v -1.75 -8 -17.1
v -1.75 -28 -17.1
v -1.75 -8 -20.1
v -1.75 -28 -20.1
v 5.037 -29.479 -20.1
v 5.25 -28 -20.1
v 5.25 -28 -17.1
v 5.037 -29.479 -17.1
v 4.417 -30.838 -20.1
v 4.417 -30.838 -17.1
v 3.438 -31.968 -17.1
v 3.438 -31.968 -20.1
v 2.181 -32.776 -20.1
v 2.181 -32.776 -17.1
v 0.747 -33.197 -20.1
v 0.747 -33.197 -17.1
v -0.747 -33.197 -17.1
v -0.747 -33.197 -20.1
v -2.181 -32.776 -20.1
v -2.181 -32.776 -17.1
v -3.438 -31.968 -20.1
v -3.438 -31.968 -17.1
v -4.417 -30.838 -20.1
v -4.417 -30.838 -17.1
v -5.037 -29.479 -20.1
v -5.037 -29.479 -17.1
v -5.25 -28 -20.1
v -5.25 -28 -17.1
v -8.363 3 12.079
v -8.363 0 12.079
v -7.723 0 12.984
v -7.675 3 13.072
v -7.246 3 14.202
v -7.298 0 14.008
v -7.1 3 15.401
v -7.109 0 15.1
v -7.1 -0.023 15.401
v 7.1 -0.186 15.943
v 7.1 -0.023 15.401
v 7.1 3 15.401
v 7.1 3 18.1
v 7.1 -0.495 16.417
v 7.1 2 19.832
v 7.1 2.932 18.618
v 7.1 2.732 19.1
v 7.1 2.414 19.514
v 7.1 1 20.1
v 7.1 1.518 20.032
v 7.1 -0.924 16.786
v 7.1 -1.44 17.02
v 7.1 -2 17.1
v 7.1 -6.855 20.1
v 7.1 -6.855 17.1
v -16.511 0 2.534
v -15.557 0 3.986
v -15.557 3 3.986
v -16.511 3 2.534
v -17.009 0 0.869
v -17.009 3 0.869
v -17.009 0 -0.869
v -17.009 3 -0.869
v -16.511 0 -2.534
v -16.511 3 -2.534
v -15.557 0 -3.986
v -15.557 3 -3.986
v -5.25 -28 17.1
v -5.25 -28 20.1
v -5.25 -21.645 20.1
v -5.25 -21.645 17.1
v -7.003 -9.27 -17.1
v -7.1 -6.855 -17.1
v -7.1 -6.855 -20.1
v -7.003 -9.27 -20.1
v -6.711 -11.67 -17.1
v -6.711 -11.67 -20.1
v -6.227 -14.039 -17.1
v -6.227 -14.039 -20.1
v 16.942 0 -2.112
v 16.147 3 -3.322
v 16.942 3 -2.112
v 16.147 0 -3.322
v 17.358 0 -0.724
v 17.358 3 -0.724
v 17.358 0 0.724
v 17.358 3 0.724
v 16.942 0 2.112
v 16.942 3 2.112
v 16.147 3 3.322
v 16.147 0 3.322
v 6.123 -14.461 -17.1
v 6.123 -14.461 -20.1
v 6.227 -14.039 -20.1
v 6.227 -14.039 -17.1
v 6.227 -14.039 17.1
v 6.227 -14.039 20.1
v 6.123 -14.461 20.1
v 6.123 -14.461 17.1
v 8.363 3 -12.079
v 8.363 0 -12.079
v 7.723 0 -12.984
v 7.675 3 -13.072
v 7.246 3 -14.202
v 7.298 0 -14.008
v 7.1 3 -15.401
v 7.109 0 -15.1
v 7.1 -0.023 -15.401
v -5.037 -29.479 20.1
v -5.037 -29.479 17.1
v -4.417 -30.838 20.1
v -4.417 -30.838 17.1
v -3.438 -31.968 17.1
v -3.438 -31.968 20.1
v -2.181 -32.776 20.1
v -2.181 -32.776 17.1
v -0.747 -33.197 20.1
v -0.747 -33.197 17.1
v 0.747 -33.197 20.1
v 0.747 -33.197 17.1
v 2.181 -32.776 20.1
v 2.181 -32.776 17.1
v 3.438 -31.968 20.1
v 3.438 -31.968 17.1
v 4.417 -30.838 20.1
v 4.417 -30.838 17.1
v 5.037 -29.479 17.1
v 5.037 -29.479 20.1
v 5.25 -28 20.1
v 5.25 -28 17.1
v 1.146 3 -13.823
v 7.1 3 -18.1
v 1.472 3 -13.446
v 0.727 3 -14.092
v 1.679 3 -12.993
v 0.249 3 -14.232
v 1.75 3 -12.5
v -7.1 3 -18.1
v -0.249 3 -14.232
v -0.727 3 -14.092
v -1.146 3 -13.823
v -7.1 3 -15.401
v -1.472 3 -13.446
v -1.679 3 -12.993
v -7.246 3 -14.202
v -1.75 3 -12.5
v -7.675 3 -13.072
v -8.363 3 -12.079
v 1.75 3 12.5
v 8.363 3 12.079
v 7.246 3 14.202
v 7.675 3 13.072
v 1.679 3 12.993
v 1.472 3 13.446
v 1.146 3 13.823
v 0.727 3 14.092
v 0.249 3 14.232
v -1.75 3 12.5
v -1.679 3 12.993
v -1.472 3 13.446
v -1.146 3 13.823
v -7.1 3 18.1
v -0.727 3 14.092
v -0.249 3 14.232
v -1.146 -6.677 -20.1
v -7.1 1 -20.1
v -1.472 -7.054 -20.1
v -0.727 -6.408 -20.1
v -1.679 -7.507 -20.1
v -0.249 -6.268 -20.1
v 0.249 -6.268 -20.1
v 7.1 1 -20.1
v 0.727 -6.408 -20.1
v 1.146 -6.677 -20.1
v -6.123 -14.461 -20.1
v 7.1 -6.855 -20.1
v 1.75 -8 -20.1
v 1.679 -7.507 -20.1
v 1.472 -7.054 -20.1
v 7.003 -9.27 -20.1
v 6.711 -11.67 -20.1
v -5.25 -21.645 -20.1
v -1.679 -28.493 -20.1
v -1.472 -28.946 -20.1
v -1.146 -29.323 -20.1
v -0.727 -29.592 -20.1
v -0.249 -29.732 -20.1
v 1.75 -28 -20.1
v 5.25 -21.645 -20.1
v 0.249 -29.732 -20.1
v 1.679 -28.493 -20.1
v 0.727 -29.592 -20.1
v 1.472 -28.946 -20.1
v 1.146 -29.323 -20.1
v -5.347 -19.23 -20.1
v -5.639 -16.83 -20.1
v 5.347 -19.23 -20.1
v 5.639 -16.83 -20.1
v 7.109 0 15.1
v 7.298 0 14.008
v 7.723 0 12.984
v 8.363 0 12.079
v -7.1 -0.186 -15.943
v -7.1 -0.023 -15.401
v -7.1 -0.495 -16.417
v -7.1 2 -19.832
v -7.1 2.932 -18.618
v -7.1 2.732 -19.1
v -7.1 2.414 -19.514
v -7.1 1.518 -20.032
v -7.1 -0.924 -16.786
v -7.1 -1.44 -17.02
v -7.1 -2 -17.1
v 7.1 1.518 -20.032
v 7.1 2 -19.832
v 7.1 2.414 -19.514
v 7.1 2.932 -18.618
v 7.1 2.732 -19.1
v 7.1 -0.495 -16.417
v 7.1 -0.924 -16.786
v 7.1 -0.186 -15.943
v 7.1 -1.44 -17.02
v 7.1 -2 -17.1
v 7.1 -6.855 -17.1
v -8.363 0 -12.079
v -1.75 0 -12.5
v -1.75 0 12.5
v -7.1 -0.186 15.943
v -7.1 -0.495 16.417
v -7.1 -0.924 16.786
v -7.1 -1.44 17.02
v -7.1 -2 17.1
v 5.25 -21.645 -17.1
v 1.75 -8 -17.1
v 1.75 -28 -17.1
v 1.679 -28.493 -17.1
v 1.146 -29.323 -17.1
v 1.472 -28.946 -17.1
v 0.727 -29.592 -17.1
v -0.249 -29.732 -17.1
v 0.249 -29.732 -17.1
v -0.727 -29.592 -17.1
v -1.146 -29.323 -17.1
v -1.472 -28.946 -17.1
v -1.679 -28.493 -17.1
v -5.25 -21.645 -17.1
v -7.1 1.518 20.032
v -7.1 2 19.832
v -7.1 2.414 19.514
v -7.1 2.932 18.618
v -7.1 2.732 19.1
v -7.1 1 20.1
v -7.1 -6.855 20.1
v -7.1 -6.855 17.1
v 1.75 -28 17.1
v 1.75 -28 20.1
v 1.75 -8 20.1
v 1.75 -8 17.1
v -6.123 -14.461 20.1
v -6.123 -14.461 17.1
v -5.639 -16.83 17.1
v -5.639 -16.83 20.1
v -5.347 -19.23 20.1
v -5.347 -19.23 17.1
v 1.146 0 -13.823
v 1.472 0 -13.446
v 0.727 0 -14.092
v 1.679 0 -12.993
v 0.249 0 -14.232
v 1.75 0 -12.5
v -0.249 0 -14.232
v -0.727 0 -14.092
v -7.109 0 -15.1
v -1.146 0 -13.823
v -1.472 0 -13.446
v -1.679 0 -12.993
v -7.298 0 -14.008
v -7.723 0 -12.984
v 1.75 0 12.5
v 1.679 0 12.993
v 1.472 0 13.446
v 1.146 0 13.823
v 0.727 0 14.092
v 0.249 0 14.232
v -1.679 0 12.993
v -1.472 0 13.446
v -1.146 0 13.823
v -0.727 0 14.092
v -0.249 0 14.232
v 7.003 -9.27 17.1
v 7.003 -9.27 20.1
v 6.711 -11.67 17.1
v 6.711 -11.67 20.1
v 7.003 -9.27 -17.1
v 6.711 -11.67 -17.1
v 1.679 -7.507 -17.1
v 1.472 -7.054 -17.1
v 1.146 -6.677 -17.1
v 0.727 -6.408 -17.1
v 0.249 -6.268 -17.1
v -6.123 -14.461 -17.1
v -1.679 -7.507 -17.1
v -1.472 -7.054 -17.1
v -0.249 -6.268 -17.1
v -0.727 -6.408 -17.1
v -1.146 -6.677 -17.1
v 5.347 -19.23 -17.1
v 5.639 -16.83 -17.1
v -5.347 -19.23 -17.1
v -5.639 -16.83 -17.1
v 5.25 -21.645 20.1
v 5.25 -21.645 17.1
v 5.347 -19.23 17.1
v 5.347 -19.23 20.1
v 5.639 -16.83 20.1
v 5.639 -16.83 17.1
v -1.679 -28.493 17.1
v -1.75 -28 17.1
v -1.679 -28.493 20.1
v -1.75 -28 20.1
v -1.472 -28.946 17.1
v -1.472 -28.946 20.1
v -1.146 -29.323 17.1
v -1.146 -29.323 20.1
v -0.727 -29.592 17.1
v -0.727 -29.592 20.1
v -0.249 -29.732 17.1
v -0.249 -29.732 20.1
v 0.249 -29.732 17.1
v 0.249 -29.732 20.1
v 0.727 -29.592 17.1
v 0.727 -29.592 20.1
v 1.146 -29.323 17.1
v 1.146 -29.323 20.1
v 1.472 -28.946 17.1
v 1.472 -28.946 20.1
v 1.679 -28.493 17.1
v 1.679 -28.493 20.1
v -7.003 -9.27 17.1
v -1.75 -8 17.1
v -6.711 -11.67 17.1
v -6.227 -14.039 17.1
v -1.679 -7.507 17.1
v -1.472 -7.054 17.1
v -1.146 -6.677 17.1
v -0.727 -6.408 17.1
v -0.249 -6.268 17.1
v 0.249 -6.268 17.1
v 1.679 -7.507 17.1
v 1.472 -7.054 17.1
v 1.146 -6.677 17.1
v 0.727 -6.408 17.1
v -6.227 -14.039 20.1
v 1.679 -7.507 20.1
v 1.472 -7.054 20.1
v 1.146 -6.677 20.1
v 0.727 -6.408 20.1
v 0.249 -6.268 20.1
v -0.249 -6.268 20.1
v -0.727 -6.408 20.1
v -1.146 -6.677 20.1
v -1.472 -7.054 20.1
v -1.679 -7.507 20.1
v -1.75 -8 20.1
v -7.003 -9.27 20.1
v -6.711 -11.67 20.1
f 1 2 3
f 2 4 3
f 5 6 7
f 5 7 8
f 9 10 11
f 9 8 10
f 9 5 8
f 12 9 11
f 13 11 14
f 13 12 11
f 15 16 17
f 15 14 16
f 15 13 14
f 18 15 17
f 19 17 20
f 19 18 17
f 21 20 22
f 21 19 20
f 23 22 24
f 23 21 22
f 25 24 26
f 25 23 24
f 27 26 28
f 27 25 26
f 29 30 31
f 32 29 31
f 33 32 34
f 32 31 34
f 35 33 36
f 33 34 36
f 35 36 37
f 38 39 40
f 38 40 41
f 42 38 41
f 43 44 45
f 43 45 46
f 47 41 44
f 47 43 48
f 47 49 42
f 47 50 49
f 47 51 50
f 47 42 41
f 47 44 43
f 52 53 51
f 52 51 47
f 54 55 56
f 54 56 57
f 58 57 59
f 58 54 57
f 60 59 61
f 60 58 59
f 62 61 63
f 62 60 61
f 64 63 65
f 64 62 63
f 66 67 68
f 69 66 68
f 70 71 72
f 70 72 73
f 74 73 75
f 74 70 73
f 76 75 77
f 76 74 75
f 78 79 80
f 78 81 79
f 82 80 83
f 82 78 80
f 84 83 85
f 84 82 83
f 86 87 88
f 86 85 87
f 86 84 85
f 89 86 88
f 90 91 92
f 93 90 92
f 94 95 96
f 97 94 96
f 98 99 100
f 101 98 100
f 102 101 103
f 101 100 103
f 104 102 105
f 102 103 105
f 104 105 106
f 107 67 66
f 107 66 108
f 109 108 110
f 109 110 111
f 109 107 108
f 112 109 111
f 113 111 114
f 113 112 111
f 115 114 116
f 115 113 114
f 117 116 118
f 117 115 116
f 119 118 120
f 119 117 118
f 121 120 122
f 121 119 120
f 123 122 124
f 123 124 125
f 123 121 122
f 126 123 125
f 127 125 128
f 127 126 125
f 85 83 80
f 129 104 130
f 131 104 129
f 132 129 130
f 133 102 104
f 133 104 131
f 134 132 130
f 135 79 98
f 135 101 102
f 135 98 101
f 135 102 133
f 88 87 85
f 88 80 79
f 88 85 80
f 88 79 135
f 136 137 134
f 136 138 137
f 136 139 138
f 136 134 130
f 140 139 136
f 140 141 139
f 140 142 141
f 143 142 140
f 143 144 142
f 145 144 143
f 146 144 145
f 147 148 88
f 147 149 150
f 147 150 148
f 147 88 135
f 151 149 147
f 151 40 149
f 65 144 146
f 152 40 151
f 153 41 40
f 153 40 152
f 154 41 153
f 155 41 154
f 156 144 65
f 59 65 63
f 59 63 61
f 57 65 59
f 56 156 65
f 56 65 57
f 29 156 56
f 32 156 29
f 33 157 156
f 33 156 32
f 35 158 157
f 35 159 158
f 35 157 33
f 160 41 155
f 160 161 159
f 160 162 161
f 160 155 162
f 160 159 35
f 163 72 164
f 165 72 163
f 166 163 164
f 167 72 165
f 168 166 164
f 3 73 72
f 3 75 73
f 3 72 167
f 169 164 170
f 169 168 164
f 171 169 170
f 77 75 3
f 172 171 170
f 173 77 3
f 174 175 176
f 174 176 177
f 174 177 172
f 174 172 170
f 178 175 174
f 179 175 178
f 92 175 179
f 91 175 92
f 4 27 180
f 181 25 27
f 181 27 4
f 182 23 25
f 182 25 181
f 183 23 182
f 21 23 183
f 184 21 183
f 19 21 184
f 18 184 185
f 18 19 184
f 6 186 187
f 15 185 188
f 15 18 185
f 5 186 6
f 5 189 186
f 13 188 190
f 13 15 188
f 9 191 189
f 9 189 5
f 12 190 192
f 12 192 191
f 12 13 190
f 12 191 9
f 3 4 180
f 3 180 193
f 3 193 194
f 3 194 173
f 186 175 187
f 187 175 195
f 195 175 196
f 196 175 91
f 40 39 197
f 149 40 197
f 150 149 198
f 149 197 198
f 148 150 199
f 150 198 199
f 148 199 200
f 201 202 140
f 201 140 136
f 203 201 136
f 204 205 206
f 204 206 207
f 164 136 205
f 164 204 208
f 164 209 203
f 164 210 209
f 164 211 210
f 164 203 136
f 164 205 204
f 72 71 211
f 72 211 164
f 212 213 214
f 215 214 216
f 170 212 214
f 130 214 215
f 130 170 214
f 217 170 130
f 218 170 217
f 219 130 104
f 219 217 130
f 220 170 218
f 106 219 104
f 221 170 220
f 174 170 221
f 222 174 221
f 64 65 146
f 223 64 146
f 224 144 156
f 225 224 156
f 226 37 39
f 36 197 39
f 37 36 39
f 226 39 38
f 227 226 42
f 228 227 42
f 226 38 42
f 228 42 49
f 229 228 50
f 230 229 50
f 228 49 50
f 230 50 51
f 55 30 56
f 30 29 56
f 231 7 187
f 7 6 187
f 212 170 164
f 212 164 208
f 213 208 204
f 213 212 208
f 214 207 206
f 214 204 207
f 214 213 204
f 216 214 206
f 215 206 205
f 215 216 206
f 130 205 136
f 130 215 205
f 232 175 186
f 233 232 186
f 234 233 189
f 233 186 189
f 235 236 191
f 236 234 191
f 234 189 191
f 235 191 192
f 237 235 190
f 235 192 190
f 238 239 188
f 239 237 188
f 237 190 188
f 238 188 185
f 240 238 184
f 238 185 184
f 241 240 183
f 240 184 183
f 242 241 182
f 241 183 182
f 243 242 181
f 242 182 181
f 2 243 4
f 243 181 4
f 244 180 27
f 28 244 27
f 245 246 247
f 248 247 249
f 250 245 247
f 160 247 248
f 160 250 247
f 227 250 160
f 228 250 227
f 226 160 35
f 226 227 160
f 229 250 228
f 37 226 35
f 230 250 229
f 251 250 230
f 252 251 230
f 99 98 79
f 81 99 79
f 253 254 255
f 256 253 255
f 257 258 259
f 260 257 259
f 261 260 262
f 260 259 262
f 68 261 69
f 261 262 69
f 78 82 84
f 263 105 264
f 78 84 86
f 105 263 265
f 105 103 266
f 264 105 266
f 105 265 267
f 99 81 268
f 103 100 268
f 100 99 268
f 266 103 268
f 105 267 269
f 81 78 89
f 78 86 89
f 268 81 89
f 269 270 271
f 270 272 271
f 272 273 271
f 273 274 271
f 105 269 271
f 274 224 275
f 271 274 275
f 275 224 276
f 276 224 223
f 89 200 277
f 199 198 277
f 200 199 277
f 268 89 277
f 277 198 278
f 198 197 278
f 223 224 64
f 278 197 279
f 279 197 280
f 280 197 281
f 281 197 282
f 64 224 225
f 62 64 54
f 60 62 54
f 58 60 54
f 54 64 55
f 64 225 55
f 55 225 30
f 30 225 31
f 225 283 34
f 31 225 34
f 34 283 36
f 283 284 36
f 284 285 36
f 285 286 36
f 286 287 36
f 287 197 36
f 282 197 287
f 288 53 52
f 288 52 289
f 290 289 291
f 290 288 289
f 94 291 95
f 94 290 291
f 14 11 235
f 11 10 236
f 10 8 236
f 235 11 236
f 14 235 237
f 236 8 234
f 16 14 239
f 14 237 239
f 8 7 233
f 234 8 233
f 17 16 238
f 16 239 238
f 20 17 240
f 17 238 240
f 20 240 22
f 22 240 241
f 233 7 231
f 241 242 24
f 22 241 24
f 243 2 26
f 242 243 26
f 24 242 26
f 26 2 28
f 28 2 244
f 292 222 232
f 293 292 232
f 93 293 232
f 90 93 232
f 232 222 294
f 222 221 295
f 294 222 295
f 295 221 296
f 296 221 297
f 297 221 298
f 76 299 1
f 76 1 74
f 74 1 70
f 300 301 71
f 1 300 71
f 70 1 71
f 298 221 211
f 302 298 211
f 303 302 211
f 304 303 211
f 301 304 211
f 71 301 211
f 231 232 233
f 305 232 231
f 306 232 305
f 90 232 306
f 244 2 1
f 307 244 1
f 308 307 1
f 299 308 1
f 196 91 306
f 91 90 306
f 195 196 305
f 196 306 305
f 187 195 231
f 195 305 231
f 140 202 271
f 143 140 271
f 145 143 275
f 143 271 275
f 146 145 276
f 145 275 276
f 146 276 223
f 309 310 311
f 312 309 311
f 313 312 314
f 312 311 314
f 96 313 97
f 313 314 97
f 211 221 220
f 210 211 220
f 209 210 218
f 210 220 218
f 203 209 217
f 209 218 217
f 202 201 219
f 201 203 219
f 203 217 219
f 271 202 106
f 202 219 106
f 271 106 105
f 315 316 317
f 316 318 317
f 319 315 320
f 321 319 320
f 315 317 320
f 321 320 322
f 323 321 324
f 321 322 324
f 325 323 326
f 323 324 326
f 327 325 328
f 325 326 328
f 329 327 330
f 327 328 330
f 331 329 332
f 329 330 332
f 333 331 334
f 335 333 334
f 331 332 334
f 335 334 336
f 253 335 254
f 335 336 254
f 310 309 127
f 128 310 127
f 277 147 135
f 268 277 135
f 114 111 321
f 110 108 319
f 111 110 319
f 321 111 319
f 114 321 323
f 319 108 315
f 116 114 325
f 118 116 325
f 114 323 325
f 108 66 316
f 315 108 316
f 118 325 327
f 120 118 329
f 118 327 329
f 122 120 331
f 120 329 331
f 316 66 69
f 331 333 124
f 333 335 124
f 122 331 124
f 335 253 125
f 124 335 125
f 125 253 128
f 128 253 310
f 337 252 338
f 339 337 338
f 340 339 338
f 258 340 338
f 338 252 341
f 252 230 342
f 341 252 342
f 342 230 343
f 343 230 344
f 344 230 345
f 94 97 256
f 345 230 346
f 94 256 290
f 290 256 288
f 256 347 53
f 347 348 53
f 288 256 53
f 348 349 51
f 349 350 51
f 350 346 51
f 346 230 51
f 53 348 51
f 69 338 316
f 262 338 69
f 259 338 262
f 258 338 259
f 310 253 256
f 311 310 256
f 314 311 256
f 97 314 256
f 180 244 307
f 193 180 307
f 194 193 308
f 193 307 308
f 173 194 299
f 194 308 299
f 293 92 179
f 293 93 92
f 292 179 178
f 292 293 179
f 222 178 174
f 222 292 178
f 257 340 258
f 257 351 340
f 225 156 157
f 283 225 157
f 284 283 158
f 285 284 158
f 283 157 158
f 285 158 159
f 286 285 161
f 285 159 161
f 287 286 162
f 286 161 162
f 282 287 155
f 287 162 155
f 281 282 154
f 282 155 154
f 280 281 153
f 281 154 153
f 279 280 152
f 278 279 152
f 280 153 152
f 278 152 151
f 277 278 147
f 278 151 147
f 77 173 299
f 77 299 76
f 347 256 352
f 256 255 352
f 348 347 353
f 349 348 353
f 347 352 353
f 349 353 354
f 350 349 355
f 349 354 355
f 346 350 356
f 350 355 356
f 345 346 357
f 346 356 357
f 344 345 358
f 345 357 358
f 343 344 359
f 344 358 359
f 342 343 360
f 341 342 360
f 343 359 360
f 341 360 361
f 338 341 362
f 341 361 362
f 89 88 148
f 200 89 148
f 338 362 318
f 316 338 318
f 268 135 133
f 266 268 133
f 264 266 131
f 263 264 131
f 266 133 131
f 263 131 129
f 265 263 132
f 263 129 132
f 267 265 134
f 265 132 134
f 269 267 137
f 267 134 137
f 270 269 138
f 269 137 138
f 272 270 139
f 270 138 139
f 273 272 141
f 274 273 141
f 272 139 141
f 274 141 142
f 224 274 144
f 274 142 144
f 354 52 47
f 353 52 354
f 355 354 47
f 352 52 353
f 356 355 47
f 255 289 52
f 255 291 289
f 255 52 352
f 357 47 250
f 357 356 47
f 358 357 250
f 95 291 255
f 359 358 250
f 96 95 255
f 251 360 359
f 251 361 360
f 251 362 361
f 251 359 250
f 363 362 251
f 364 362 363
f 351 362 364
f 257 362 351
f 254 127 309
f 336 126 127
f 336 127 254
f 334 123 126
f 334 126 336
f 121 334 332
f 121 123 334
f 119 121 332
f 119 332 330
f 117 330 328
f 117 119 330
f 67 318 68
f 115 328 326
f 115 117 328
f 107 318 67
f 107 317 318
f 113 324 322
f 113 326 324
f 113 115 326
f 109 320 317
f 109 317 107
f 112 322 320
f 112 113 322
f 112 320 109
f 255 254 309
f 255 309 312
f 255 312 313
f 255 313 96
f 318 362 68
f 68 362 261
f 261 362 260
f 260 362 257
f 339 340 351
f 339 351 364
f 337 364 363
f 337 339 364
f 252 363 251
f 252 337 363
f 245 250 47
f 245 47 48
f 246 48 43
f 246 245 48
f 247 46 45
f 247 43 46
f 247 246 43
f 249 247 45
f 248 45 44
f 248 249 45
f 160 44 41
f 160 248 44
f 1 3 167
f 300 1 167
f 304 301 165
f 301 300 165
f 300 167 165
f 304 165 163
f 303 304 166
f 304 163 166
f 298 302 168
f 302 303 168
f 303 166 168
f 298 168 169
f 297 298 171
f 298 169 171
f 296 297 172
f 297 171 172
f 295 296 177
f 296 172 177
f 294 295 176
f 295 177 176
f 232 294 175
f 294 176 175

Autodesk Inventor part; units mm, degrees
ref_plane "YZ Plane" through (0, 0, 0) normal (1, 0, 0) x (0, 1, 0)
ref_plane "XZ Plane" through (0, 0, 0) normal (0, 1, 0) x (-1, 0, 0)
ref_plane "XY Plane" through (0, 0, 0) normal (0, 0, 1) x (1, 0, 0)
sketch "Sketch1" plane through (0, 0, 0) normal (0, 1, 0) x (-1, 0, 0)
  line L0 (7.1, -20.1) -> (-7.1, -20.1)
  line L1 (-7.1, -20.1) -> (-7.1, 20.1)
  line L2 (-7.1, 20.1) -> (7.1, 20.1)
  line L3 (7.1, 20.1) -> (7.1, -20.1)
  line L4 (7.1, -20.1) -> (-7.1, 20.1) construction
  line L5 (-7.1, -20.1) -> (7.1, 20.1) construction
  circle A0 centre (0, 12.1) radius 2
  point P0 (0, 0)
  dimension "d0" = 14.2
  dimension "d1" = 40.2
  dimension "d4" = 4
  dimension "d5" = 8
  dimension "d6" = 7.1
extrude "Extrusion1" add sketch "Sketch1" along normal blind 3 contours L0 L1 L2 L3 | A0
sketch "Sketch2" plane through (-7.1, 0, 20.1) normal (0, 0, 1) x (1, 0, 0)
  line L0 (7.1, -28) -> (7.1, -8) construction
  line L1 (8.85, -28) -> (8.85, -8)
  line L2 (5.35, -8) -> (5.35, -28)
  arc A0 (5.35, -28) -> (8.85, -28) centre (7.1, -28) ccw
  arc A1 (8.85, -8) -> (5.35, -8) centre (7.1, -8) ccw
  line L3 (0, 0) -> (0, 3) projected
  line L4 (0, 0) -> (14.2, 0) projected
  line L5 (1.85, -28) -> (1.85, -8)
  arc A2 (12.35, -8) -> (1.85, -8) centre (7.1, -8) ccw
  line L6 (12.35, -8) -> (12.35, -28)
  arc A3 (1.85, -28) -> (12.35, -28) centre (7.1, -28) ccw
  line L7 (0, 0) -> (0, -10.5)
  line L8 (0, -10.5) -> (1.85, -18)
  line L9 (14.2, 0) -> (14.2, -10.5)
  line L10 (14.2, -10.5) -> (12.35, -18)
  point P0 (7.1, 0)
  point P1 (7.1, -18)
  point P2 (8.85, -18)
  dimension "d7" = 7.1
  dimension "d8" = 3.5
  dimension "d9" = 20
  dimension "d10" = 18
  dimension "d11" = 3.5
extrude "Extrusion2" add sketch "Sketch2" against normal blind 3
mirror "Mirror1" about plane through (0, 0, 0) normal (0, 0, 1) of "Extrusion2"
fillet "Fillet1" radius 30 8 edges at (7.1, -10.5, 18.6) (5.25, -18, 18.6) (-7.1, -10.5, 18.6) (-5.25, -18, 18.6) (7.1, -10.5, -18.6) (5.25, -18, -18.6) (-7.1, -10.5, -18.6) (-5.25, -18, -18.6)
sketch "Sketch3" plane through (0, 3, 0) normal (0, 1, 0) x (1, 0, 0)
  line L0 (-7.1, -13.5) -> (7.1, -13.5) projected
  line L1 (-7.1, -13.5) -> (-19.1, 0)
  line L2 (7.1, 13.5) -> (-7.1, 13.5) projected
  line L3 (-19.1, 0) -> (-7.1, 13.5)
  line L4 (-7.1, 13.5) -> (-7.1, -13.5)
  line L5 (-7.1, 20.1) -> (-7.1, -20.1) projected
  line L6 (-7.1, 0) -> (-19.1, 0)
  point P0 (0, 0)
  point P1 (-7.1, 0)
  point P2 (-7.1, 14.5)
  point P3 (-7.1, -14.5)
  dimension "d17" = 12
extrude "Extrusion3" add sketch "Sketch3" against normal blind 3
fillet "Fillet4" radius 6 1 edges at (-19.1, 1.5, 0)
fillet "Fillet5" radius 5 2 edges at (-7.1, 1.5, 13.5) (-7.1, 1.5, -13.5)
mirror "Mirror2" about plane through (0, 0, 0) normal (1, 0, 0) of "Extrusion3"
fillet "Fillet6" radius 5 2 edges at (7.1, 1.5, 13.5) (7.1, 1.5, -13.5)
fillet "Fillet7" radius 5 1 edges at (19.1, 1.5, 0)
fillet "Fillet8" radius 2 4 edges at (0, 3, 20.1) (0, 3, -20.1) (0, 0, -17.1) (0, 0, 17.1)
sketch "Sketch4" plane through (0, 3, 0) normal (0, 1, 0) x (1, 0, 0)
  line L0 (0, -12.5) -> (0, 12.5) construction
  line L1 (1.75, -12.5) -> (1.75, 12.5)
  line L2 (-1.75, 12.5) -> (-1.75, -12.5)
  arc A0 (-1.75, -12.5) -> (1.75, -12.5) centre (0, -12.5) ccw
  arc A1 (1.75, 12.5) -> (-1.75, 12.5) centre (0, 12.5) ccw
  point P0 (0, 0)
  dimension "d26" = 3.5
  dimension "d27" = 25
extrude "Extrusion4" cut sketch "Sketch4" against normal blind 10
properties part number "SoporteSensorDeInterrupcionesEJEX"
